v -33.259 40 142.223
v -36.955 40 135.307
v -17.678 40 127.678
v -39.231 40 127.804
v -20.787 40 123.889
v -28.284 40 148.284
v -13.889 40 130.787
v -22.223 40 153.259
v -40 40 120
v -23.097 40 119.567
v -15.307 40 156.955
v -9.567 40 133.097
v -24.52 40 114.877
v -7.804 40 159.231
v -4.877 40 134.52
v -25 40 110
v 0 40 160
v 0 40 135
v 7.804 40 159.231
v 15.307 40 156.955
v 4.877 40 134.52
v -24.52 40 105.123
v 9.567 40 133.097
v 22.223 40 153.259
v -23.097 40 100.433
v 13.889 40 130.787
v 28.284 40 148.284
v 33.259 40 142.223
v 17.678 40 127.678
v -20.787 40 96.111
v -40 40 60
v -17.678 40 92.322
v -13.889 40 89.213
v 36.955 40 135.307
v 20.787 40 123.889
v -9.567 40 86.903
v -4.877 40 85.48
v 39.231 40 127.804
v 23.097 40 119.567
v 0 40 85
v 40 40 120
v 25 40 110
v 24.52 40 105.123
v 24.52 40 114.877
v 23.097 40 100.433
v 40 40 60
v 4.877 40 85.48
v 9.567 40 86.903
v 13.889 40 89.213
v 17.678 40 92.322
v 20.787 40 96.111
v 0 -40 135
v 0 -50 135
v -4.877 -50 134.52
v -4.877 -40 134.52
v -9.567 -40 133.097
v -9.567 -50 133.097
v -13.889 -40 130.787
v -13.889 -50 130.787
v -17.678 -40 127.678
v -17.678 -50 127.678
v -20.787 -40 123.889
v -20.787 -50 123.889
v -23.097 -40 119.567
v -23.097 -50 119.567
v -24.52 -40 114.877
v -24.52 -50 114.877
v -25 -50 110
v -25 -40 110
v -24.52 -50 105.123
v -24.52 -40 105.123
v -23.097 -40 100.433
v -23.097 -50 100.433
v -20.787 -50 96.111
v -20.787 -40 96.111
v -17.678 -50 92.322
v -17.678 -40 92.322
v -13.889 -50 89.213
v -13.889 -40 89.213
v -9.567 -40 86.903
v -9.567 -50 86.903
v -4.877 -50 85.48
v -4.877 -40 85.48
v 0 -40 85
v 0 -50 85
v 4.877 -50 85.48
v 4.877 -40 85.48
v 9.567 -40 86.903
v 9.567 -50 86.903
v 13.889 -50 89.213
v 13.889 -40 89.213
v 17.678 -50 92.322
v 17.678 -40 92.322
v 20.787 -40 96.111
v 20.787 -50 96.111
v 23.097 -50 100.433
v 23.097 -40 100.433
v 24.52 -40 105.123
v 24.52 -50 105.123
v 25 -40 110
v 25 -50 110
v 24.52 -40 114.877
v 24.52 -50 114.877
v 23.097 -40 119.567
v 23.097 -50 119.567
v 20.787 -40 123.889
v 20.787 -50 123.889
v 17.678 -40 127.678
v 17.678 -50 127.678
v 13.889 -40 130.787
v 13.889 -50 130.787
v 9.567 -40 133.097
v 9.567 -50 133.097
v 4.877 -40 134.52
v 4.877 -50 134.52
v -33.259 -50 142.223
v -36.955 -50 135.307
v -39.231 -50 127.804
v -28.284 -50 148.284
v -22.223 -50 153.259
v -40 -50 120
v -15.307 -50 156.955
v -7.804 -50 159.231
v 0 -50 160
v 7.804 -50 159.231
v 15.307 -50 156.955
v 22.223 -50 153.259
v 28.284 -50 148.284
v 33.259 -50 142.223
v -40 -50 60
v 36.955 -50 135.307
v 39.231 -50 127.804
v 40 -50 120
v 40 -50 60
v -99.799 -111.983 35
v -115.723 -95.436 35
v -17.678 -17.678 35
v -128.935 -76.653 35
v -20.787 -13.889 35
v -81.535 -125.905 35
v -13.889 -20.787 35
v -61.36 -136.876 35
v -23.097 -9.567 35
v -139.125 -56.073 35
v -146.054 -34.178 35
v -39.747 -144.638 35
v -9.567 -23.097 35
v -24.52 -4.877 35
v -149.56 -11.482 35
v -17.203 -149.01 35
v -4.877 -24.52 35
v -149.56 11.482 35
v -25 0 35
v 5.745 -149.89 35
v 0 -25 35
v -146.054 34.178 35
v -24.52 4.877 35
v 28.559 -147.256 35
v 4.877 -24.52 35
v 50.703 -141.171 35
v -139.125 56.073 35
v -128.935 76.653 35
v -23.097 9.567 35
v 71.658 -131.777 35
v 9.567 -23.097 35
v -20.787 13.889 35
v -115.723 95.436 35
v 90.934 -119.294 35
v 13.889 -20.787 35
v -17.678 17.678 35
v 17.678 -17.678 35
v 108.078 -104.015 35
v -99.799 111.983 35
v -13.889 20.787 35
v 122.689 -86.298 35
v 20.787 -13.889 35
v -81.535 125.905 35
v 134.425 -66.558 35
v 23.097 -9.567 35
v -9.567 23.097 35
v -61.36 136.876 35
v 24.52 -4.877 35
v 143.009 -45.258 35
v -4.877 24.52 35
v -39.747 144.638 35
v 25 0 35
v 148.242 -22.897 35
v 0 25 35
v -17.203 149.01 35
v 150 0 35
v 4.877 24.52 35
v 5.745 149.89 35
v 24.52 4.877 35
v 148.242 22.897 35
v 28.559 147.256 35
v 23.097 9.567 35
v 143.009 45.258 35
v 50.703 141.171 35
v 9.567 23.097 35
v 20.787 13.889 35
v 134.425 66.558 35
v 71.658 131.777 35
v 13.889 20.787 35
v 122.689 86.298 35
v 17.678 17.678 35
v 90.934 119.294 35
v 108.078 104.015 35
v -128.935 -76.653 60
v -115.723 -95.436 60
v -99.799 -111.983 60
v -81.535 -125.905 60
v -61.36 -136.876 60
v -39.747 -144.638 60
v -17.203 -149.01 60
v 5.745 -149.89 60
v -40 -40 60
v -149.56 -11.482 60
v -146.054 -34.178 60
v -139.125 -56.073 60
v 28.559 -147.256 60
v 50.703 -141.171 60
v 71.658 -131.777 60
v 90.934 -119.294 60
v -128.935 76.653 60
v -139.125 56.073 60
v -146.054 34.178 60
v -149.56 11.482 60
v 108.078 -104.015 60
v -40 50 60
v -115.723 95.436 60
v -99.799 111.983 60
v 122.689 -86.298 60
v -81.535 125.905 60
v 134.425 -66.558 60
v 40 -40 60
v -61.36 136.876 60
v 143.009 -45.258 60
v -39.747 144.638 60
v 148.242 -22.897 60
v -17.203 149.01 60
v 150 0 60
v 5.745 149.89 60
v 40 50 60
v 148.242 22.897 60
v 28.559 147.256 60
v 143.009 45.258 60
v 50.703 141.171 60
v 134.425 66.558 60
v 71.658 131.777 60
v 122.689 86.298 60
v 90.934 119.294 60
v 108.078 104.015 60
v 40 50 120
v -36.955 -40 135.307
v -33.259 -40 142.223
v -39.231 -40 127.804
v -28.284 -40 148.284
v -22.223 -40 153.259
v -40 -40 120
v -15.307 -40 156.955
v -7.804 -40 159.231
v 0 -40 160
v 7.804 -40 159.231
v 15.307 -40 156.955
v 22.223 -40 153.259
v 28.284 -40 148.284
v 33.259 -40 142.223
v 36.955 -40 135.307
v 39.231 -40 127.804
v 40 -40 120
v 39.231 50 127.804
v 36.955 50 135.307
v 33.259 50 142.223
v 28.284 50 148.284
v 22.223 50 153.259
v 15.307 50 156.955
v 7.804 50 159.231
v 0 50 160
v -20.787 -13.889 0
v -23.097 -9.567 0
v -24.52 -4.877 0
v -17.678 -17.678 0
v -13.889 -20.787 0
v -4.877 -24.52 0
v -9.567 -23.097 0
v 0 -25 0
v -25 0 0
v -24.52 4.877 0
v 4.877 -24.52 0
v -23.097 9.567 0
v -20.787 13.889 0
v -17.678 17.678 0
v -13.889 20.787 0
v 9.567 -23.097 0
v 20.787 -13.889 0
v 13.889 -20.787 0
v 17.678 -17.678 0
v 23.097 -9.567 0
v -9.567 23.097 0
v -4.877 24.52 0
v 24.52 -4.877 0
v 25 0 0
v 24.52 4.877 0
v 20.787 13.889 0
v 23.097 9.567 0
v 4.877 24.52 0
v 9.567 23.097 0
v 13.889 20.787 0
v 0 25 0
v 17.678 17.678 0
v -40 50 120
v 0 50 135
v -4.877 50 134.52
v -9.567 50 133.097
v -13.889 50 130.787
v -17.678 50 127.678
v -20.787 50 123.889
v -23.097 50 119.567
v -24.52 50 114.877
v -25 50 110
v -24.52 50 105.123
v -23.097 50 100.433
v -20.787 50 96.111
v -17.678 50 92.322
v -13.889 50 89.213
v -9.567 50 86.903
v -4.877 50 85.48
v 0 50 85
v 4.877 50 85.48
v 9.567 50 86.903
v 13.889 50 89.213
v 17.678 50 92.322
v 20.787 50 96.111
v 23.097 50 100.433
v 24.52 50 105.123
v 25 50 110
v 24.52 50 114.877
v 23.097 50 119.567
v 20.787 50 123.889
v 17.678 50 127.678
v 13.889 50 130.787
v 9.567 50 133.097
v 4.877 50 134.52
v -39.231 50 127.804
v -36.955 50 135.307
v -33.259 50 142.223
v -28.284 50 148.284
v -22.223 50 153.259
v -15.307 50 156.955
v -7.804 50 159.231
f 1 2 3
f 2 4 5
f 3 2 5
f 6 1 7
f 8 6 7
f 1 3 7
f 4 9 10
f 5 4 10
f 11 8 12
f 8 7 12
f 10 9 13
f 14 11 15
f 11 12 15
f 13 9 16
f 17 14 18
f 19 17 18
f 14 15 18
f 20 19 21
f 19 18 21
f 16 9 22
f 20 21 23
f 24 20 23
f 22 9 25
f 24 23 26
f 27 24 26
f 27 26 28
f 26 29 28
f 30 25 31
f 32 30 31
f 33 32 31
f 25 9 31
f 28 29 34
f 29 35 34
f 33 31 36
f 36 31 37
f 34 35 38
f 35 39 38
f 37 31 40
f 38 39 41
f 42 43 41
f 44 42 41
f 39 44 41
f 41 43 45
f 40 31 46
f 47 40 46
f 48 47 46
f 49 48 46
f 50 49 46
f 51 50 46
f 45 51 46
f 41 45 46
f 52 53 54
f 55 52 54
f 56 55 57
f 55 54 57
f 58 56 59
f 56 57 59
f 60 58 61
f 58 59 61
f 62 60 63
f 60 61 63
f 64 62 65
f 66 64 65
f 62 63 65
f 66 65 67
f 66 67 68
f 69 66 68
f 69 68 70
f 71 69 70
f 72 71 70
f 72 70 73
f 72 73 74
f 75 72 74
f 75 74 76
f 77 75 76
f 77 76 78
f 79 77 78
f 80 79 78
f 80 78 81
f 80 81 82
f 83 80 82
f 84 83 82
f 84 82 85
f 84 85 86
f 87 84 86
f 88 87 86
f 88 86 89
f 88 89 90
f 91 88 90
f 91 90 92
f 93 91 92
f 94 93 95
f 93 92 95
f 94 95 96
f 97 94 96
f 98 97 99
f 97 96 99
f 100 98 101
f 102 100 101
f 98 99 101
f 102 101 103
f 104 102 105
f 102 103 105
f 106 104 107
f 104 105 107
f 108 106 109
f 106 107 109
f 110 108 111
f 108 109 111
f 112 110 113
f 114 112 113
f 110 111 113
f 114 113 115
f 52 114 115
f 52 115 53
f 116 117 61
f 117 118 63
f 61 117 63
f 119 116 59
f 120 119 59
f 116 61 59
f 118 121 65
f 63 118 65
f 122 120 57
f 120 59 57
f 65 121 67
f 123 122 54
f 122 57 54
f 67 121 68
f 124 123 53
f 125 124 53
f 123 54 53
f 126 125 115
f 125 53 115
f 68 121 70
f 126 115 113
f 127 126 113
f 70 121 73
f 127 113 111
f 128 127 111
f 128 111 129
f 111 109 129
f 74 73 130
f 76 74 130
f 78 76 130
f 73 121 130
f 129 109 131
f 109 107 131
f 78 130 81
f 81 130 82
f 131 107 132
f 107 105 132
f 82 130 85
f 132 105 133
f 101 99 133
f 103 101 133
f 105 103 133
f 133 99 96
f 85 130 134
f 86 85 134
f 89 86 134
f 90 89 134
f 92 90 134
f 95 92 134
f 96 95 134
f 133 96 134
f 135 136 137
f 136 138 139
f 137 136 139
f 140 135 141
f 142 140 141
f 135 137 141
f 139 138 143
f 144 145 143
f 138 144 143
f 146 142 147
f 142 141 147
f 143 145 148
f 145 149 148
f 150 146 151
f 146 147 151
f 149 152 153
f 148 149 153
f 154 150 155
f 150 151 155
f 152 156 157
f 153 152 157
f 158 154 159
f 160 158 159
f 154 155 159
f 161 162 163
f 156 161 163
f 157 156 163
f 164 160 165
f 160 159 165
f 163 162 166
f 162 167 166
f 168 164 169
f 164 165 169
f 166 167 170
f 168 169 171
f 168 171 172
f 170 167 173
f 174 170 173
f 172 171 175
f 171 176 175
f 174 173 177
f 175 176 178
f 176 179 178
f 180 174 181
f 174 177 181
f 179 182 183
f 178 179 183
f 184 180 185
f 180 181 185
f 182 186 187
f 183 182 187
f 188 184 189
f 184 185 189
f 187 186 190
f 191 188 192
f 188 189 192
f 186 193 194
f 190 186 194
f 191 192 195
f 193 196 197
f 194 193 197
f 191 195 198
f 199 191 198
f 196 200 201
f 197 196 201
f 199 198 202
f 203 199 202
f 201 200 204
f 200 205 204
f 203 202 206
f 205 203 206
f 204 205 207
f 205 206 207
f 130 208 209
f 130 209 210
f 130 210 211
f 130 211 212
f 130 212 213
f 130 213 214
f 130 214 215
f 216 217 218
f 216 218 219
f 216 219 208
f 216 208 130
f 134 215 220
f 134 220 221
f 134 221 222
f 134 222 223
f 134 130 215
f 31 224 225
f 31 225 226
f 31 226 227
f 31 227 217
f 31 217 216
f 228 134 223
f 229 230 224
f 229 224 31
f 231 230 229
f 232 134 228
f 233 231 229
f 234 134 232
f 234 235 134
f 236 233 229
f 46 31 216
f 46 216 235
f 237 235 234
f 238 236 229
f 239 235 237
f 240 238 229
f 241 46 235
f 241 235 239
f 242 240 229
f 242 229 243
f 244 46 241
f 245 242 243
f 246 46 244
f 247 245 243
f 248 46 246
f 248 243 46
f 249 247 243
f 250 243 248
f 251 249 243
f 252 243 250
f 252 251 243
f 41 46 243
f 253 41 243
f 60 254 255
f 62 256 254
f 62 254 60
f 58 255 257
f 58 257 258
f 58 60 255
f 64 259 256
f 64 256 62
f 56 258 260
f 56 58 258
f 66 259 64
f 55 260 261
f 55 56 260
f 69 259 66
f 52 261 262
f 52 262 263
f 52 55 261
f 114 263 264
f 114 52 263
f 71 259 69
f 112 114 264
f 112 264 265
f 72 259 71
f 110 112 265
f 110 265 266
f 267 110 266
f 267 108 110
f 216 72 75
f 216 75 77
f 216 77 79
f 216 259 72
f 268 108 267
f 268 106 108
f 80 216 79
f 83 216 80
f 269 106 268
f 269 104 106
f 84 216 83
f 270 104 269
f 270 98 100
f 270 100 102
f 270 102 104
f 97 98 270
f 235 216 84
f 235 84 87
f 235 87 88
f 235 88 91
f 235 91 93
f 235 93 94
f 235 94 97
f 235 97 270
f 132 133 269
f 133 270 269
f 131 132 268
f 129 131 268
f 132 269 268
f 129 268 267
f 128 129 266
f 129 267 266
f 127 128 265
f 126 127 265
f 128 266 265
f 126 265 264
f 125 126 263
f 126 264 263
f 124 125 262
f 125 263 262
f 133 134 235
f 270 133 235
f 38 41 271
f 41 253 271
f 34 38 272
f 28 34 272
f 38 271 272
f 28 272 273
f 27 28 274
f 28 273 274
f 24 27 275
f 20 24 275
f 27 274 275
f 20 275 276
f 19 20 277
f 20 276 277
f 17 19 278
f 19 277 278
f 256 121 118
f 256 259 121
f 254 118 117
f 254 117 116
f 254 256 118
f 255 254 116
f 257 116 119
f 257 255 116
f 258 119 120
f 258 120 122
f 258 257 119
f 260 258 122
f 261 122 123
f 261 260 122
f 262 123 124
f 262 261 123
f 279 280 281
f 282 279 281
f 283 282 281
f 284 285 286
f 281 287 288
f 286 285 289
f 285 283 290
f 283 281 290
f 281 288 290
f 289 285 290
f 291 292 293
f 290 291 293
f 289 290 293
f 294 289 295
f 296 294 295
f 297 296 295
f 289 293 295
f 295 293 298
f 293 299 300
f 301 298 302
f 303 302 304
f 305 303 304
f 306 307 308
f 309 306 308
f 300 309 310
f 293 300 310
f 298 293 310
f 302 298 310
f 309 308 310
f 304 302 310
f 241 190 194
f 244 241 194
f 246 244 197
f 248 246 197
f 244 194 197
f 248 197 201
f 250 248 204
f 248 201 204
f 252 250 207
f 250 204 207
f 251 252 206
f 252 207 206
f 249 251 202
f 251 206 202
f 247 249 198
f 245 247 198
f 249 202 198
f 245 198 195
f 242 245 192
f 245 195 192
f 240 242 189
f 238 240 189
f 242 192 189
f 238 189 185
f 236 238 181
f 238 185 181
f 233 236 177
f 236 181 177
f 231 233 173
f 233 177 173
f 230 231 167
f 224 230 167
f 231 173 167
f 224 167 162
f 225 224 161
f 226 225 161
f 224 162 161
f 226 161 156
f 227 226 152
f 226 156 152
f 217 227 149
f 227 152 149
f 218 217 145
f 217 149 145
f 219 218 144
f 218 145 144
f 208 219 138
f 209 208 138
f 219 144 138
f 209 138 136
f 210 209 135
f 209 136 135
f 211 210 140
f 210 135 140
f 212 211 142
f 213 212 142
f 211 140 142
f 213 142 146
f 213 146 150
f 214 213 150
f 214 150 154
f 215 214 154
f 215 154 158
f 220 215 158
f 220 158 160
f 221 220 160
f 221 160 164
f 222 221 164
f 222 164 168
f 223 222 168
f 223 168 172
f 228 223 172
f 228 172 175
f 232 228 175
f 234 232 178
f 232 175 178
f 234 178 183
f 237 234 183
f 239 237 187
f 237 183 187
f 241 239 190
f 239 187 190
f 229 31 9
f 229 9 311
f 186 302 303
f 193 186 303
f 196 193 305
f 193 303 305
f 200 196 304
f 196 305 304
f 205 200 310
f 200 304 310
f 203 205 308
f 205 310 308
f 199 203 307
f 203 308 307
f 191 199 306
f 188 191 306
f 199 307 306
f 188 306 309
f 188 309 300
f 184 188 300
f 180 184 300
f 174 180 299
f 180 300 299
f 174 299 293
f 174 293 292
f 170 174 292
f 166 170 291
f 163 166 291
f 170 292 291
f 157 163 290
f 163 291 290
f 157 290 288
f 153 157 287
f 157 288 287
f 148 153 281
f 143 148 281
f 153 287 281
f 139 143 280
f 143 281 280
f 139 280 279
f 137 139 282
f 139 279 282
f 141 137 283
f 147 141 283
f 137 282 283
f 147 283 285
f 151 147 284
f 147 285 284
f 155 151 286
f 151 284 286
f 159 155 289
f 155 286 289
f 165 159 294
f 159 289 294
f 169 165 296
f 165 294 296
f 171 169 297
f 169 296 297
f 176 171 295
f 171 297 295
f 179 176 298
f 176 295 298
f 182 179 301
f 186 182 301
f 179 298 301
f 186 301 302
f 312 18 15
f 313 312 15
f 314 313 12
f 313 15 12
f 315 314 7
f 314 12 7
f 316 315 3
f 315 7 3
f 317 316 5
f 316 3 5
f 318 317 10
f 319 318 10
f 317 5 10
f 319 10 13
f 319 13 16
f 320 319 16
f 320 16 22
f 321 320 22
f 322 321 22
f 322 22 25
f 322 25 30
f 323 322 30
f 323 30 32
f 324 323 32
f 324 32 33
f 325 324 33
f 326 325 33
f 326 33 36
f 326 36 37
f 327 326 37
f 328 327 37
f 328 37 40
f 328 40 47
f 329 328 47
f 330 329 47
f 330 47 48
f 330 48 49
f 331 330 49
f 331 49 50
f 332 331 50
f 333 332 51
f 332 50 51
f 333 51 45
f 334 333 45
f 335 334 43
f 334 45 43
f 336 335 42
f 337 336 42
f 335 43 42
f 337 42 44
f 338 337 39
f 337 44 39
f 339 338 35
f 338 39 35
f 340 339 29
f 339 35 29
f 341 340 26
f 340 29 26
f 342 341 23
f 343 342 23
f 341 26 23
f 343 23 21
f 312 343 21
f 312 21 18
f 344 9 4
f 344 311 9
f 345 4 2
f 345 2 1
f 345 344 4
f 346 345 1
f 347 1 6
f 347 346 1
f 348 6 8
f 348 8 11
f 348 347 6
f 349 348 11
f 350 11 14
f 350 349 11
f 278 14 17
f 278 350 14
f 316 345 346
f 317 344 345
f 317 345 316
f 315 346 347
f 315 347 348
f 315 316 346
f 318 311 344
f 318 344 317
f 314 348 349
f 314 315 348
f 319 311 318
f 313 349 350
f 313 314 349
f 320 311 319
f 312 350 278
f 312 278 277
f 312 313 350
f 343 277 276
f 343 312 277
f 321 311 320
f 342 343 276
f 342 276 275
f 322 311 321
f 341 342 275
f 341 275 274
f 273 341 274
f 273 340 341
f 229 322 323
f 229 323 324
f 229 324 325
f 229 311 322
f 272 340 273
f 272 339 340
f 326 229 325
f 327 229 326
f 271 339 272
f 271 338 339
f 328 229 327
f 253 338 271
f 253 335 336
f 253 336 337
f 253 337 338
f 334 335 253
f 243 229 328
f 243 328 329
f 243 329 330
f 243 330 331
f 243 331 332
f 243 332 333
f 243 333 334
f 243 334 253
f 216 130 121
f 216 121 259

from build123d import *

# Parameters (mm, degrees)
SKETCH1_R           = 25
BOSS_EXTRUDE1_DEPTH = 35
SKETCH2_R           = 150
BOSS_EXTRUDE2_DEPTH = 25
SKETCH3_W           = 80
SKETCH3_H           = 10
BOSS_EXTRUDE3_DEPTH = 100
SKETCH4_R           = 25
CUT_EXTRUDE1_DEPTH  = 297.816441593
FILLET1_R           = 40


with BuildPart() as part:
    # Sketch1 → Boss-Extrude1 (new body)
    with BuildSketch(Plane.XY):
        Circle(SKETCH1_R)
    extrude(amount=BOSS_EXTRUDE1_DEPTH)

    # Sketch2 → Boss-Extrude2 (add)
    with BuildSketch(Plane.XY.offset(35)):
        Circle(SKETCH2_R)
    extrude(amount=BOSS_EXTRUDE2_DEPTH)

    # Sketch3 → Boss-Extrude3 (add)
    with BuildSketch(Plane.XY.offset(60)):
        with Locations((0, -45)):
            Rectangle(SKETCH3_W, SKETCH3_H)
        with Locations((0, 45)):
            Rectangle(SKETCH3_W, SKETCH3_H)
    extrude(amount=BOSS_EXTRUDE3_DEPTH)

    # Sketch4 → Cut-Extrude1 (cut, through all)
    with BuildSketch(Plane.XZ.offset(50)):
        with Locations(Location((0, 110, 0), (0, 0, 90))):
            Circle(SKETCH4_R)
    extrude(amount=-CUT_EXTRUDE1_DEPTH, mode=Mode.SUBTRACT)

    # Fillet1
    fillet1_edges = [part.edges().sort_by_distance(p)[0] for p in [
        (40, -45, 160),
        (40, 45, 160),
        (-40, 45, 160),
        (-40, -45, 160),
    ]]
    fillet(fillet1_edges, radius=FILLET1_R - 0.0001)  # a hair under: the kernel refuses the full size


solid = part.part
